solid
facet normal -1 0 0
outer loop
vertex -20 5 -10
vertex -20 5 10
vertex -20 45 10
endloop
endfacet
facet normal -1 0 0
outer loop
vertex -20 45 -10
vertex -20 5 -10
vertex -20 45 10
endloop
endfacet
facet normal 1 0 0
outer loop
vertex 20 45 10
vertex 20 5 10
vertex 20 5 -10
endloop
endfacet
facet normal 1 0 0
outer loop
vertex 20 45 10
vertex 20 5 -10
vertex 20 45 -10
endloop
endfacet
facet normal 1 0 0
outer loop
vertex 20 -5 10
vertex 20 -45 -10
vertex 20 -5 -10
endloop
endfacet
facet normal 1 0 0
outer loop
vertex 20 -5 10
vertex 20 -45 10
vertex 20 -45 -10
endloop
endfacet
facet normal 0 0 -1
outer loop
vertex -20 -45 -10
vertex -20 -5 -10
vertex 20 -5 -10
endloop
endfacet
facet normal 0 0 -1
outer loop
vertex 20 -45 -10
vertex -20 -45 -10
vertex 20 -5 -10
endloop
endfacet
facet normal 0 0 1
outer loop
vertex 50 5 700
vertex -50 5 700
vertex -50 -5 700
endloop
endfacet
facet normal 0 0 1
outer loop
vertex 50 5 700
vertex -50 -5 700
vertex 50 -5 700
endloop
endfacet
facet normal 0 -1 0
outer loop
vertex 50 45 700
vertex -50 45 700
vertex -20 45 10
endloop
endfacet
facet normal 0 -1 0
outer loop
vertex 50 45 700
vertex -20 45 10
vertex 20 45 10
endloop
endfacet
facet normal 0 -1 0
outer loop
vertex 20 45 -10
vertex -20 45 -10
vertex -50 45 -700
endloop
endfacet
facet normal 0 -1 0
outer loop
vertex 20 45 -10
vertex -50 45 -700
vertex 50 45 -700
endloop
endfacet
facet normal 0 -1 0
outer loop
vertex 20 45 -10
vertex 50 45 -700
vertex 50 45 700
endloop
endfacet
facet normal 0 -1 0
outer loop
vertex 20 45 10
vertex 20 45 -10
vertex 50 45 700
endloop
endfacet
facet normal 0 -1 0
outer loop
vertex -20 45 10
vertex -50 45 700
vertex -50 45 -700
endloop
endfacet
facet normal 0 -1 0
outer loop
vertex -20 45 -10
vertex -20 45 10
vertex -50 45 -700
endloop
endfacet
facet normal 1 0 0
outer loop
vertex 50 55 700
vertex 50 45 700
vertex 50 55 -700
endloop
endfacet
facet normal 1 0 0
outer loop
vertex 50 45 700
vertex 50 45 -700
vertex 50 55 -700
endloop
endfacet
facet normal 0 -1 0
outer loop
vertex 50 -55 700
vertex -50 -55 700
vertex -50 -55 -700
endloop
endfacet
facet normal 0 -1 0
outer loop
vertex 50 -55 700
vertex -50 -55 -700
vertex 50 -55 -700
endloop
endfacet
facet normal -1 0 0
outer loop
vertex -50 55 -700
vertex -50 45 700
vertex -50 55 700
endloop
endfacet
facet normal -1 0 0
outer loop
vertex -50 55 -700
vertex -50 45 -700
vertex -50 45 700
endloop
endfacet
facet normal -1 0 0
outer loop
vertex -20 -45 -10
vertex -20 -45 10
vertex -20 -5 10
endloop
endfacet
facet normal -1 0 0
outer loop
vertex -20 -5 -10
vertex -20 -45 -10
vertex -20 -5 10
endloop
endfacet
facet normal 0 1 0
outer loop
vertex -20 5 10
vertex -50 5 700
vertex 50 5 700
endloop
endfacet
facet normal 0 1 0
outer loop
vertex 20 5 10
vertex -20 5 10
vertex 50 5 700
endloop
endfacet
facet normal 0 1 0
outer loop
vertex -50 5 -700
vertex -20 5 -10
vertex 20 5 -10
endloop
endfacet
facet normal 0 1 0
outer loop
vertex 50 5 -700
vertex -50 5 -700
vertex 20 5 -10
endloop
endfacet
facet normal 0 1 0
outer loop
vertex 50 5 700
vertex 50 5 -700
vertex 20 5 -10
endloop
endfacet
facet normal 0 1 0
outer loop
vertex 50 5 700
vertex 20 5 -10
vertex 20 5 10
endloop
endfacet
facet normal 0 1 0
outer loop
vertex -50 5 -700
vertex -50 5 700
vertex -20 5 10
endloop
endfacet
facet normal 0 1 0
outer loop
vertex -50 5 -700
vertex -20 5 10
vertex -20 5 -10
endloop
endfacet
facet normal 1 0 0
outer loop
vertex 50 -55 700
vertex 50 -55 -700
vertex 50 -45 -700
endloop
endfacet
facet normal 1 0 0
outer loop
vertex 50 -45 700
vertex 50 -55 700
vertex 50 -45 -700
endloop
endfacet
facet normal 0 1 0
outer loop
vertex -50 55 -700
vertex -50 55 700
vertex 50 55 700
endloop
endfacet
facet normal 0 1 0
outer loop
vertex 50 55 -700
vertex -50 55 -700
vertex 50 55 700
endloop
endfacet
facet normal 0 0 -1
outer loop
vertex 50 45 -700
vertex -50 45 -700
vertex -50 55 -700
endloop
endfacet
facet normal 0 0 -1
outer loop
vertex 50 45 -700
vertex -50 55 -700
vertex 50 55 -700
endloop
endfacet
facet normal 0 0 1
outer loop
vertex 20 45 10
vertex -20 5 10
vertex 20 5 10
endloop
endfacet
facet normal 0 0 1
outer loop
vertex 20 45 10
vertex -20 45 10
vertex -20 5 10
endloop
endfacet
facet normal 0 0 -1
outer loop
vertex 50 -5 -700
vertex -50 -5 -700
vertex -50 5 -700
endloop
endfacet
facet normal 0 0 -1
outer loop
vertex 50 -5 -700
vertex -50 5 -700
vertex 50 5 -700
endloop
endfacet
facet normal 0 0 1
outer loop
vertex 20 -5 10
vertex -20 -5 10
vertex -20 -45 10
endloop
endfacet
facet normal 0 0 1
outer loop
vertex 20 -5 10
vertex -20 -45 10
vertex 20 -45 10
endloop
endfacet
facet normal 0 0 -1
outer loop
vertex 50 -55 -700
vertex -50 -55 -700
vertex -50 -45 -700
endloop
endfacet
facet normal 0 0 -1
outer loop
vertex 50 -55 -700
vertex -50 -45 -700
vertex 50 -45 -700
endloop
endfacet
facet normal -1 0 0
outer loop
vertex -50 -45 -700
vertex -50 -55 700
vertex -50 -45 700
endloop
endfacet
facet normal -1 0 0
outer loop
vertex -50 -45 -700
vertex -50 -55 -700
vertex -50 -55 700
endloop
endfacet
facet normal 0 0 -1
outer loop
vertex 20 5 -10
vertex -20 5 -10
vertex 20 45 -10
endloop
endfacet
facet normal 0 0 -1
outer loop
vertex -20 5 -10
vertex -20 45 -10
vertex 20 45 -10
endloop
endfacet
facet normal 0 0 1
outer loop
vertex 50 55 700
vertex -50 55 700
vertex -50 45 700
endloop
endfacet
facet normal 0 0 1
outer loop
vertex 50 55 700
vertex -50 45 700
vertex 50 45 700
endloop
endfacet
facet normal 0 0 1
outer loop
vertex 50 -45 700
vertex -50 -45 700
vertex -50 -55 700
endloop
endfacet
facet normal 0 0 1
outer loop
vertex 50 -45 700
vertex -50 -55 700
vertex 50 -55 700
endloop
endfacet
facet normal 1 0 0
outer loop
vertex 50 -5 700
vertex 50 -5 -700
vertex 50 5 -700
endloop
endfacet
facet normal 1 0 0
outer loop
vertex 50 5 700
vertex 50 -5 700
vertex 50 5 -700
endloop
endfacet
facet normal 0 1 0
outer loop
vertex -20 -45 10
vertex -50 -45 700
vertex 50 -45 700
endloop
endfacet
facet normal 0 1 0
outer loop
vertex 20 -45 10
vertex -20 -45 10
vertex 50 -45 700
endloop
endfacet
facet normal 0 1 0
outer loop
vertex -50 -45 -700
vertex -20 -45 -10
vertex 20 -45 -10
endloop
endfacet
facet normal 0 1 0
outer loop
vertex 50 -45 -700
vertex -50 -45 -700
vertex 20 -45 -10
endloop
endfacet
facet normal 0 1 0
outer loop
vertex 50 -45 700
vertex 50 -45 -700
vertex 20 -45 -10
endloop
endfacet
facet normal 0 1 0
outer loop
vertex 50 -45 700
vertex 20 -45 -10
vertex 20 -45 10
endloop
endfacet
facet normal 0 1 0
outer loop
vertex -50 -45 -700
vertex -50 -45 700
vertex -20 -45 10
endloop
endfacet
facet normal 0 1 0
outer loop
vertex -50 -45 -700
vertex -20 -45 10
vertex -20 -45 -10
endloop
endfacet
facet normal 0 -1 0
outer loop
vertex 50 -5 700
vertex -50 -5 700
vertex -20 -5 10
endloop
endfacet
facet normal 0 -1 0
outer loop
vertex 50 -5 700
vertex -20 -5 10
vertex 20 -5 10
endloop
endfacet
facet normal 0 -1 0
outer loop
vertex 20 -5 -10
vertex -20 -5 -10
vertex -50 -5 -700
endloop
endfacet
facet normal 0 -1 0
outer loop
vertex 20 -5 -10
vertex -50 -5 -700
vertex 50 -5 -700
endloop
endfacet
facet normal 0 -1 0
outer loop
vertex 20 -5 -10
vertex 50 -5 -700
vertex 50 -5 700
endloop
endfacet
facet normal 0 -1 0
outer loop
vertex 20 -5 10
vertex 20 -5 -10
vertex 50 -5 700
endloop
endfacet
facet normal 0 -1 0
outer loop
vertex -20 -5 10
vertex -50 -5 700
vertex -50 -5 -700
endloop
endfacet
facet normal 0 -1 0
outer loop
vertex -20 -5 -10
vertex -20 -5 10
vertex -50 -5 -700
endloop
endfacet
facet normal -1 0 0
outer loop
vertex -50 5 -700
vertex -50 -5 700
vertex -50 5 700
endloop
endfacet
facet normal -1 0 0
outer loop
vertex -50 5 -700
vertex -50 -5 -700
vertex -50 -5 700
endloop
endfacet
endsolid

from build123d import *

# Parameters (mm, degrees)
F0_W     = 40
F0_H     = 40
F1_DEPTH = 10
F2_W     = 100
F2_H     = 10
F3_DEPTH = 690
F4_W     = 100
F4_H     = 10
F5_DEPTH = 690


with BuildPart() as f1:
    # F0 (on Top) → F1 (new body, symmetric)
    with BuildSketch(Plane.XY):
        Polygon((20, -5), (50, -5), (50, 5), (20, 5), (-20, 5), (-50, 5), (-50, -5), (-20, -5), align=None)
        with Locations((0, 25)):
            Rectangle(F0_W, F0_H)
        with Locations((0, -25)):
            Rectangle(F0_W, F0_H)
        Polygon((-20, 45), (20, 45), (50, 45), (50, 55), (-50, 55), (-50, 45), align=None)
        Polygon((50, -45), (20, -45), (-20, -45), (-50, -45), (-50, -55), (50, -55), align=None)
    extrude(amount=F1_DEPTH, both=True)

    # F2 (on face) → F3 (join)
    with BuildSketch(Plane(origin=(0, 0, -10), x_dir=(1, 0, 0), z_dir=(0, 0, -1))):
        Rectangle(F2_W, F2_H)
        with Locations((0, 50)):
            Rectangle(F2_W, F2_H)
        with Locations((0, -50)):
            Rectangle(F2_W, F2_H)
    extrude(amount=F3_DEPTH)

    # F4 (on face) → F5 (join)
    with BuildSketch(Plane.XY.offset(10)):
        with Locations((0, 50)):
            Rectangle(F4_W, F4_H)
        Rectangle(F4_W, F4_H)
        with Locations((0, -50)):
            Rectangle(F4_W, F4_H)
    extrude(amount=F5_DEPTH)


solid = f1.part
